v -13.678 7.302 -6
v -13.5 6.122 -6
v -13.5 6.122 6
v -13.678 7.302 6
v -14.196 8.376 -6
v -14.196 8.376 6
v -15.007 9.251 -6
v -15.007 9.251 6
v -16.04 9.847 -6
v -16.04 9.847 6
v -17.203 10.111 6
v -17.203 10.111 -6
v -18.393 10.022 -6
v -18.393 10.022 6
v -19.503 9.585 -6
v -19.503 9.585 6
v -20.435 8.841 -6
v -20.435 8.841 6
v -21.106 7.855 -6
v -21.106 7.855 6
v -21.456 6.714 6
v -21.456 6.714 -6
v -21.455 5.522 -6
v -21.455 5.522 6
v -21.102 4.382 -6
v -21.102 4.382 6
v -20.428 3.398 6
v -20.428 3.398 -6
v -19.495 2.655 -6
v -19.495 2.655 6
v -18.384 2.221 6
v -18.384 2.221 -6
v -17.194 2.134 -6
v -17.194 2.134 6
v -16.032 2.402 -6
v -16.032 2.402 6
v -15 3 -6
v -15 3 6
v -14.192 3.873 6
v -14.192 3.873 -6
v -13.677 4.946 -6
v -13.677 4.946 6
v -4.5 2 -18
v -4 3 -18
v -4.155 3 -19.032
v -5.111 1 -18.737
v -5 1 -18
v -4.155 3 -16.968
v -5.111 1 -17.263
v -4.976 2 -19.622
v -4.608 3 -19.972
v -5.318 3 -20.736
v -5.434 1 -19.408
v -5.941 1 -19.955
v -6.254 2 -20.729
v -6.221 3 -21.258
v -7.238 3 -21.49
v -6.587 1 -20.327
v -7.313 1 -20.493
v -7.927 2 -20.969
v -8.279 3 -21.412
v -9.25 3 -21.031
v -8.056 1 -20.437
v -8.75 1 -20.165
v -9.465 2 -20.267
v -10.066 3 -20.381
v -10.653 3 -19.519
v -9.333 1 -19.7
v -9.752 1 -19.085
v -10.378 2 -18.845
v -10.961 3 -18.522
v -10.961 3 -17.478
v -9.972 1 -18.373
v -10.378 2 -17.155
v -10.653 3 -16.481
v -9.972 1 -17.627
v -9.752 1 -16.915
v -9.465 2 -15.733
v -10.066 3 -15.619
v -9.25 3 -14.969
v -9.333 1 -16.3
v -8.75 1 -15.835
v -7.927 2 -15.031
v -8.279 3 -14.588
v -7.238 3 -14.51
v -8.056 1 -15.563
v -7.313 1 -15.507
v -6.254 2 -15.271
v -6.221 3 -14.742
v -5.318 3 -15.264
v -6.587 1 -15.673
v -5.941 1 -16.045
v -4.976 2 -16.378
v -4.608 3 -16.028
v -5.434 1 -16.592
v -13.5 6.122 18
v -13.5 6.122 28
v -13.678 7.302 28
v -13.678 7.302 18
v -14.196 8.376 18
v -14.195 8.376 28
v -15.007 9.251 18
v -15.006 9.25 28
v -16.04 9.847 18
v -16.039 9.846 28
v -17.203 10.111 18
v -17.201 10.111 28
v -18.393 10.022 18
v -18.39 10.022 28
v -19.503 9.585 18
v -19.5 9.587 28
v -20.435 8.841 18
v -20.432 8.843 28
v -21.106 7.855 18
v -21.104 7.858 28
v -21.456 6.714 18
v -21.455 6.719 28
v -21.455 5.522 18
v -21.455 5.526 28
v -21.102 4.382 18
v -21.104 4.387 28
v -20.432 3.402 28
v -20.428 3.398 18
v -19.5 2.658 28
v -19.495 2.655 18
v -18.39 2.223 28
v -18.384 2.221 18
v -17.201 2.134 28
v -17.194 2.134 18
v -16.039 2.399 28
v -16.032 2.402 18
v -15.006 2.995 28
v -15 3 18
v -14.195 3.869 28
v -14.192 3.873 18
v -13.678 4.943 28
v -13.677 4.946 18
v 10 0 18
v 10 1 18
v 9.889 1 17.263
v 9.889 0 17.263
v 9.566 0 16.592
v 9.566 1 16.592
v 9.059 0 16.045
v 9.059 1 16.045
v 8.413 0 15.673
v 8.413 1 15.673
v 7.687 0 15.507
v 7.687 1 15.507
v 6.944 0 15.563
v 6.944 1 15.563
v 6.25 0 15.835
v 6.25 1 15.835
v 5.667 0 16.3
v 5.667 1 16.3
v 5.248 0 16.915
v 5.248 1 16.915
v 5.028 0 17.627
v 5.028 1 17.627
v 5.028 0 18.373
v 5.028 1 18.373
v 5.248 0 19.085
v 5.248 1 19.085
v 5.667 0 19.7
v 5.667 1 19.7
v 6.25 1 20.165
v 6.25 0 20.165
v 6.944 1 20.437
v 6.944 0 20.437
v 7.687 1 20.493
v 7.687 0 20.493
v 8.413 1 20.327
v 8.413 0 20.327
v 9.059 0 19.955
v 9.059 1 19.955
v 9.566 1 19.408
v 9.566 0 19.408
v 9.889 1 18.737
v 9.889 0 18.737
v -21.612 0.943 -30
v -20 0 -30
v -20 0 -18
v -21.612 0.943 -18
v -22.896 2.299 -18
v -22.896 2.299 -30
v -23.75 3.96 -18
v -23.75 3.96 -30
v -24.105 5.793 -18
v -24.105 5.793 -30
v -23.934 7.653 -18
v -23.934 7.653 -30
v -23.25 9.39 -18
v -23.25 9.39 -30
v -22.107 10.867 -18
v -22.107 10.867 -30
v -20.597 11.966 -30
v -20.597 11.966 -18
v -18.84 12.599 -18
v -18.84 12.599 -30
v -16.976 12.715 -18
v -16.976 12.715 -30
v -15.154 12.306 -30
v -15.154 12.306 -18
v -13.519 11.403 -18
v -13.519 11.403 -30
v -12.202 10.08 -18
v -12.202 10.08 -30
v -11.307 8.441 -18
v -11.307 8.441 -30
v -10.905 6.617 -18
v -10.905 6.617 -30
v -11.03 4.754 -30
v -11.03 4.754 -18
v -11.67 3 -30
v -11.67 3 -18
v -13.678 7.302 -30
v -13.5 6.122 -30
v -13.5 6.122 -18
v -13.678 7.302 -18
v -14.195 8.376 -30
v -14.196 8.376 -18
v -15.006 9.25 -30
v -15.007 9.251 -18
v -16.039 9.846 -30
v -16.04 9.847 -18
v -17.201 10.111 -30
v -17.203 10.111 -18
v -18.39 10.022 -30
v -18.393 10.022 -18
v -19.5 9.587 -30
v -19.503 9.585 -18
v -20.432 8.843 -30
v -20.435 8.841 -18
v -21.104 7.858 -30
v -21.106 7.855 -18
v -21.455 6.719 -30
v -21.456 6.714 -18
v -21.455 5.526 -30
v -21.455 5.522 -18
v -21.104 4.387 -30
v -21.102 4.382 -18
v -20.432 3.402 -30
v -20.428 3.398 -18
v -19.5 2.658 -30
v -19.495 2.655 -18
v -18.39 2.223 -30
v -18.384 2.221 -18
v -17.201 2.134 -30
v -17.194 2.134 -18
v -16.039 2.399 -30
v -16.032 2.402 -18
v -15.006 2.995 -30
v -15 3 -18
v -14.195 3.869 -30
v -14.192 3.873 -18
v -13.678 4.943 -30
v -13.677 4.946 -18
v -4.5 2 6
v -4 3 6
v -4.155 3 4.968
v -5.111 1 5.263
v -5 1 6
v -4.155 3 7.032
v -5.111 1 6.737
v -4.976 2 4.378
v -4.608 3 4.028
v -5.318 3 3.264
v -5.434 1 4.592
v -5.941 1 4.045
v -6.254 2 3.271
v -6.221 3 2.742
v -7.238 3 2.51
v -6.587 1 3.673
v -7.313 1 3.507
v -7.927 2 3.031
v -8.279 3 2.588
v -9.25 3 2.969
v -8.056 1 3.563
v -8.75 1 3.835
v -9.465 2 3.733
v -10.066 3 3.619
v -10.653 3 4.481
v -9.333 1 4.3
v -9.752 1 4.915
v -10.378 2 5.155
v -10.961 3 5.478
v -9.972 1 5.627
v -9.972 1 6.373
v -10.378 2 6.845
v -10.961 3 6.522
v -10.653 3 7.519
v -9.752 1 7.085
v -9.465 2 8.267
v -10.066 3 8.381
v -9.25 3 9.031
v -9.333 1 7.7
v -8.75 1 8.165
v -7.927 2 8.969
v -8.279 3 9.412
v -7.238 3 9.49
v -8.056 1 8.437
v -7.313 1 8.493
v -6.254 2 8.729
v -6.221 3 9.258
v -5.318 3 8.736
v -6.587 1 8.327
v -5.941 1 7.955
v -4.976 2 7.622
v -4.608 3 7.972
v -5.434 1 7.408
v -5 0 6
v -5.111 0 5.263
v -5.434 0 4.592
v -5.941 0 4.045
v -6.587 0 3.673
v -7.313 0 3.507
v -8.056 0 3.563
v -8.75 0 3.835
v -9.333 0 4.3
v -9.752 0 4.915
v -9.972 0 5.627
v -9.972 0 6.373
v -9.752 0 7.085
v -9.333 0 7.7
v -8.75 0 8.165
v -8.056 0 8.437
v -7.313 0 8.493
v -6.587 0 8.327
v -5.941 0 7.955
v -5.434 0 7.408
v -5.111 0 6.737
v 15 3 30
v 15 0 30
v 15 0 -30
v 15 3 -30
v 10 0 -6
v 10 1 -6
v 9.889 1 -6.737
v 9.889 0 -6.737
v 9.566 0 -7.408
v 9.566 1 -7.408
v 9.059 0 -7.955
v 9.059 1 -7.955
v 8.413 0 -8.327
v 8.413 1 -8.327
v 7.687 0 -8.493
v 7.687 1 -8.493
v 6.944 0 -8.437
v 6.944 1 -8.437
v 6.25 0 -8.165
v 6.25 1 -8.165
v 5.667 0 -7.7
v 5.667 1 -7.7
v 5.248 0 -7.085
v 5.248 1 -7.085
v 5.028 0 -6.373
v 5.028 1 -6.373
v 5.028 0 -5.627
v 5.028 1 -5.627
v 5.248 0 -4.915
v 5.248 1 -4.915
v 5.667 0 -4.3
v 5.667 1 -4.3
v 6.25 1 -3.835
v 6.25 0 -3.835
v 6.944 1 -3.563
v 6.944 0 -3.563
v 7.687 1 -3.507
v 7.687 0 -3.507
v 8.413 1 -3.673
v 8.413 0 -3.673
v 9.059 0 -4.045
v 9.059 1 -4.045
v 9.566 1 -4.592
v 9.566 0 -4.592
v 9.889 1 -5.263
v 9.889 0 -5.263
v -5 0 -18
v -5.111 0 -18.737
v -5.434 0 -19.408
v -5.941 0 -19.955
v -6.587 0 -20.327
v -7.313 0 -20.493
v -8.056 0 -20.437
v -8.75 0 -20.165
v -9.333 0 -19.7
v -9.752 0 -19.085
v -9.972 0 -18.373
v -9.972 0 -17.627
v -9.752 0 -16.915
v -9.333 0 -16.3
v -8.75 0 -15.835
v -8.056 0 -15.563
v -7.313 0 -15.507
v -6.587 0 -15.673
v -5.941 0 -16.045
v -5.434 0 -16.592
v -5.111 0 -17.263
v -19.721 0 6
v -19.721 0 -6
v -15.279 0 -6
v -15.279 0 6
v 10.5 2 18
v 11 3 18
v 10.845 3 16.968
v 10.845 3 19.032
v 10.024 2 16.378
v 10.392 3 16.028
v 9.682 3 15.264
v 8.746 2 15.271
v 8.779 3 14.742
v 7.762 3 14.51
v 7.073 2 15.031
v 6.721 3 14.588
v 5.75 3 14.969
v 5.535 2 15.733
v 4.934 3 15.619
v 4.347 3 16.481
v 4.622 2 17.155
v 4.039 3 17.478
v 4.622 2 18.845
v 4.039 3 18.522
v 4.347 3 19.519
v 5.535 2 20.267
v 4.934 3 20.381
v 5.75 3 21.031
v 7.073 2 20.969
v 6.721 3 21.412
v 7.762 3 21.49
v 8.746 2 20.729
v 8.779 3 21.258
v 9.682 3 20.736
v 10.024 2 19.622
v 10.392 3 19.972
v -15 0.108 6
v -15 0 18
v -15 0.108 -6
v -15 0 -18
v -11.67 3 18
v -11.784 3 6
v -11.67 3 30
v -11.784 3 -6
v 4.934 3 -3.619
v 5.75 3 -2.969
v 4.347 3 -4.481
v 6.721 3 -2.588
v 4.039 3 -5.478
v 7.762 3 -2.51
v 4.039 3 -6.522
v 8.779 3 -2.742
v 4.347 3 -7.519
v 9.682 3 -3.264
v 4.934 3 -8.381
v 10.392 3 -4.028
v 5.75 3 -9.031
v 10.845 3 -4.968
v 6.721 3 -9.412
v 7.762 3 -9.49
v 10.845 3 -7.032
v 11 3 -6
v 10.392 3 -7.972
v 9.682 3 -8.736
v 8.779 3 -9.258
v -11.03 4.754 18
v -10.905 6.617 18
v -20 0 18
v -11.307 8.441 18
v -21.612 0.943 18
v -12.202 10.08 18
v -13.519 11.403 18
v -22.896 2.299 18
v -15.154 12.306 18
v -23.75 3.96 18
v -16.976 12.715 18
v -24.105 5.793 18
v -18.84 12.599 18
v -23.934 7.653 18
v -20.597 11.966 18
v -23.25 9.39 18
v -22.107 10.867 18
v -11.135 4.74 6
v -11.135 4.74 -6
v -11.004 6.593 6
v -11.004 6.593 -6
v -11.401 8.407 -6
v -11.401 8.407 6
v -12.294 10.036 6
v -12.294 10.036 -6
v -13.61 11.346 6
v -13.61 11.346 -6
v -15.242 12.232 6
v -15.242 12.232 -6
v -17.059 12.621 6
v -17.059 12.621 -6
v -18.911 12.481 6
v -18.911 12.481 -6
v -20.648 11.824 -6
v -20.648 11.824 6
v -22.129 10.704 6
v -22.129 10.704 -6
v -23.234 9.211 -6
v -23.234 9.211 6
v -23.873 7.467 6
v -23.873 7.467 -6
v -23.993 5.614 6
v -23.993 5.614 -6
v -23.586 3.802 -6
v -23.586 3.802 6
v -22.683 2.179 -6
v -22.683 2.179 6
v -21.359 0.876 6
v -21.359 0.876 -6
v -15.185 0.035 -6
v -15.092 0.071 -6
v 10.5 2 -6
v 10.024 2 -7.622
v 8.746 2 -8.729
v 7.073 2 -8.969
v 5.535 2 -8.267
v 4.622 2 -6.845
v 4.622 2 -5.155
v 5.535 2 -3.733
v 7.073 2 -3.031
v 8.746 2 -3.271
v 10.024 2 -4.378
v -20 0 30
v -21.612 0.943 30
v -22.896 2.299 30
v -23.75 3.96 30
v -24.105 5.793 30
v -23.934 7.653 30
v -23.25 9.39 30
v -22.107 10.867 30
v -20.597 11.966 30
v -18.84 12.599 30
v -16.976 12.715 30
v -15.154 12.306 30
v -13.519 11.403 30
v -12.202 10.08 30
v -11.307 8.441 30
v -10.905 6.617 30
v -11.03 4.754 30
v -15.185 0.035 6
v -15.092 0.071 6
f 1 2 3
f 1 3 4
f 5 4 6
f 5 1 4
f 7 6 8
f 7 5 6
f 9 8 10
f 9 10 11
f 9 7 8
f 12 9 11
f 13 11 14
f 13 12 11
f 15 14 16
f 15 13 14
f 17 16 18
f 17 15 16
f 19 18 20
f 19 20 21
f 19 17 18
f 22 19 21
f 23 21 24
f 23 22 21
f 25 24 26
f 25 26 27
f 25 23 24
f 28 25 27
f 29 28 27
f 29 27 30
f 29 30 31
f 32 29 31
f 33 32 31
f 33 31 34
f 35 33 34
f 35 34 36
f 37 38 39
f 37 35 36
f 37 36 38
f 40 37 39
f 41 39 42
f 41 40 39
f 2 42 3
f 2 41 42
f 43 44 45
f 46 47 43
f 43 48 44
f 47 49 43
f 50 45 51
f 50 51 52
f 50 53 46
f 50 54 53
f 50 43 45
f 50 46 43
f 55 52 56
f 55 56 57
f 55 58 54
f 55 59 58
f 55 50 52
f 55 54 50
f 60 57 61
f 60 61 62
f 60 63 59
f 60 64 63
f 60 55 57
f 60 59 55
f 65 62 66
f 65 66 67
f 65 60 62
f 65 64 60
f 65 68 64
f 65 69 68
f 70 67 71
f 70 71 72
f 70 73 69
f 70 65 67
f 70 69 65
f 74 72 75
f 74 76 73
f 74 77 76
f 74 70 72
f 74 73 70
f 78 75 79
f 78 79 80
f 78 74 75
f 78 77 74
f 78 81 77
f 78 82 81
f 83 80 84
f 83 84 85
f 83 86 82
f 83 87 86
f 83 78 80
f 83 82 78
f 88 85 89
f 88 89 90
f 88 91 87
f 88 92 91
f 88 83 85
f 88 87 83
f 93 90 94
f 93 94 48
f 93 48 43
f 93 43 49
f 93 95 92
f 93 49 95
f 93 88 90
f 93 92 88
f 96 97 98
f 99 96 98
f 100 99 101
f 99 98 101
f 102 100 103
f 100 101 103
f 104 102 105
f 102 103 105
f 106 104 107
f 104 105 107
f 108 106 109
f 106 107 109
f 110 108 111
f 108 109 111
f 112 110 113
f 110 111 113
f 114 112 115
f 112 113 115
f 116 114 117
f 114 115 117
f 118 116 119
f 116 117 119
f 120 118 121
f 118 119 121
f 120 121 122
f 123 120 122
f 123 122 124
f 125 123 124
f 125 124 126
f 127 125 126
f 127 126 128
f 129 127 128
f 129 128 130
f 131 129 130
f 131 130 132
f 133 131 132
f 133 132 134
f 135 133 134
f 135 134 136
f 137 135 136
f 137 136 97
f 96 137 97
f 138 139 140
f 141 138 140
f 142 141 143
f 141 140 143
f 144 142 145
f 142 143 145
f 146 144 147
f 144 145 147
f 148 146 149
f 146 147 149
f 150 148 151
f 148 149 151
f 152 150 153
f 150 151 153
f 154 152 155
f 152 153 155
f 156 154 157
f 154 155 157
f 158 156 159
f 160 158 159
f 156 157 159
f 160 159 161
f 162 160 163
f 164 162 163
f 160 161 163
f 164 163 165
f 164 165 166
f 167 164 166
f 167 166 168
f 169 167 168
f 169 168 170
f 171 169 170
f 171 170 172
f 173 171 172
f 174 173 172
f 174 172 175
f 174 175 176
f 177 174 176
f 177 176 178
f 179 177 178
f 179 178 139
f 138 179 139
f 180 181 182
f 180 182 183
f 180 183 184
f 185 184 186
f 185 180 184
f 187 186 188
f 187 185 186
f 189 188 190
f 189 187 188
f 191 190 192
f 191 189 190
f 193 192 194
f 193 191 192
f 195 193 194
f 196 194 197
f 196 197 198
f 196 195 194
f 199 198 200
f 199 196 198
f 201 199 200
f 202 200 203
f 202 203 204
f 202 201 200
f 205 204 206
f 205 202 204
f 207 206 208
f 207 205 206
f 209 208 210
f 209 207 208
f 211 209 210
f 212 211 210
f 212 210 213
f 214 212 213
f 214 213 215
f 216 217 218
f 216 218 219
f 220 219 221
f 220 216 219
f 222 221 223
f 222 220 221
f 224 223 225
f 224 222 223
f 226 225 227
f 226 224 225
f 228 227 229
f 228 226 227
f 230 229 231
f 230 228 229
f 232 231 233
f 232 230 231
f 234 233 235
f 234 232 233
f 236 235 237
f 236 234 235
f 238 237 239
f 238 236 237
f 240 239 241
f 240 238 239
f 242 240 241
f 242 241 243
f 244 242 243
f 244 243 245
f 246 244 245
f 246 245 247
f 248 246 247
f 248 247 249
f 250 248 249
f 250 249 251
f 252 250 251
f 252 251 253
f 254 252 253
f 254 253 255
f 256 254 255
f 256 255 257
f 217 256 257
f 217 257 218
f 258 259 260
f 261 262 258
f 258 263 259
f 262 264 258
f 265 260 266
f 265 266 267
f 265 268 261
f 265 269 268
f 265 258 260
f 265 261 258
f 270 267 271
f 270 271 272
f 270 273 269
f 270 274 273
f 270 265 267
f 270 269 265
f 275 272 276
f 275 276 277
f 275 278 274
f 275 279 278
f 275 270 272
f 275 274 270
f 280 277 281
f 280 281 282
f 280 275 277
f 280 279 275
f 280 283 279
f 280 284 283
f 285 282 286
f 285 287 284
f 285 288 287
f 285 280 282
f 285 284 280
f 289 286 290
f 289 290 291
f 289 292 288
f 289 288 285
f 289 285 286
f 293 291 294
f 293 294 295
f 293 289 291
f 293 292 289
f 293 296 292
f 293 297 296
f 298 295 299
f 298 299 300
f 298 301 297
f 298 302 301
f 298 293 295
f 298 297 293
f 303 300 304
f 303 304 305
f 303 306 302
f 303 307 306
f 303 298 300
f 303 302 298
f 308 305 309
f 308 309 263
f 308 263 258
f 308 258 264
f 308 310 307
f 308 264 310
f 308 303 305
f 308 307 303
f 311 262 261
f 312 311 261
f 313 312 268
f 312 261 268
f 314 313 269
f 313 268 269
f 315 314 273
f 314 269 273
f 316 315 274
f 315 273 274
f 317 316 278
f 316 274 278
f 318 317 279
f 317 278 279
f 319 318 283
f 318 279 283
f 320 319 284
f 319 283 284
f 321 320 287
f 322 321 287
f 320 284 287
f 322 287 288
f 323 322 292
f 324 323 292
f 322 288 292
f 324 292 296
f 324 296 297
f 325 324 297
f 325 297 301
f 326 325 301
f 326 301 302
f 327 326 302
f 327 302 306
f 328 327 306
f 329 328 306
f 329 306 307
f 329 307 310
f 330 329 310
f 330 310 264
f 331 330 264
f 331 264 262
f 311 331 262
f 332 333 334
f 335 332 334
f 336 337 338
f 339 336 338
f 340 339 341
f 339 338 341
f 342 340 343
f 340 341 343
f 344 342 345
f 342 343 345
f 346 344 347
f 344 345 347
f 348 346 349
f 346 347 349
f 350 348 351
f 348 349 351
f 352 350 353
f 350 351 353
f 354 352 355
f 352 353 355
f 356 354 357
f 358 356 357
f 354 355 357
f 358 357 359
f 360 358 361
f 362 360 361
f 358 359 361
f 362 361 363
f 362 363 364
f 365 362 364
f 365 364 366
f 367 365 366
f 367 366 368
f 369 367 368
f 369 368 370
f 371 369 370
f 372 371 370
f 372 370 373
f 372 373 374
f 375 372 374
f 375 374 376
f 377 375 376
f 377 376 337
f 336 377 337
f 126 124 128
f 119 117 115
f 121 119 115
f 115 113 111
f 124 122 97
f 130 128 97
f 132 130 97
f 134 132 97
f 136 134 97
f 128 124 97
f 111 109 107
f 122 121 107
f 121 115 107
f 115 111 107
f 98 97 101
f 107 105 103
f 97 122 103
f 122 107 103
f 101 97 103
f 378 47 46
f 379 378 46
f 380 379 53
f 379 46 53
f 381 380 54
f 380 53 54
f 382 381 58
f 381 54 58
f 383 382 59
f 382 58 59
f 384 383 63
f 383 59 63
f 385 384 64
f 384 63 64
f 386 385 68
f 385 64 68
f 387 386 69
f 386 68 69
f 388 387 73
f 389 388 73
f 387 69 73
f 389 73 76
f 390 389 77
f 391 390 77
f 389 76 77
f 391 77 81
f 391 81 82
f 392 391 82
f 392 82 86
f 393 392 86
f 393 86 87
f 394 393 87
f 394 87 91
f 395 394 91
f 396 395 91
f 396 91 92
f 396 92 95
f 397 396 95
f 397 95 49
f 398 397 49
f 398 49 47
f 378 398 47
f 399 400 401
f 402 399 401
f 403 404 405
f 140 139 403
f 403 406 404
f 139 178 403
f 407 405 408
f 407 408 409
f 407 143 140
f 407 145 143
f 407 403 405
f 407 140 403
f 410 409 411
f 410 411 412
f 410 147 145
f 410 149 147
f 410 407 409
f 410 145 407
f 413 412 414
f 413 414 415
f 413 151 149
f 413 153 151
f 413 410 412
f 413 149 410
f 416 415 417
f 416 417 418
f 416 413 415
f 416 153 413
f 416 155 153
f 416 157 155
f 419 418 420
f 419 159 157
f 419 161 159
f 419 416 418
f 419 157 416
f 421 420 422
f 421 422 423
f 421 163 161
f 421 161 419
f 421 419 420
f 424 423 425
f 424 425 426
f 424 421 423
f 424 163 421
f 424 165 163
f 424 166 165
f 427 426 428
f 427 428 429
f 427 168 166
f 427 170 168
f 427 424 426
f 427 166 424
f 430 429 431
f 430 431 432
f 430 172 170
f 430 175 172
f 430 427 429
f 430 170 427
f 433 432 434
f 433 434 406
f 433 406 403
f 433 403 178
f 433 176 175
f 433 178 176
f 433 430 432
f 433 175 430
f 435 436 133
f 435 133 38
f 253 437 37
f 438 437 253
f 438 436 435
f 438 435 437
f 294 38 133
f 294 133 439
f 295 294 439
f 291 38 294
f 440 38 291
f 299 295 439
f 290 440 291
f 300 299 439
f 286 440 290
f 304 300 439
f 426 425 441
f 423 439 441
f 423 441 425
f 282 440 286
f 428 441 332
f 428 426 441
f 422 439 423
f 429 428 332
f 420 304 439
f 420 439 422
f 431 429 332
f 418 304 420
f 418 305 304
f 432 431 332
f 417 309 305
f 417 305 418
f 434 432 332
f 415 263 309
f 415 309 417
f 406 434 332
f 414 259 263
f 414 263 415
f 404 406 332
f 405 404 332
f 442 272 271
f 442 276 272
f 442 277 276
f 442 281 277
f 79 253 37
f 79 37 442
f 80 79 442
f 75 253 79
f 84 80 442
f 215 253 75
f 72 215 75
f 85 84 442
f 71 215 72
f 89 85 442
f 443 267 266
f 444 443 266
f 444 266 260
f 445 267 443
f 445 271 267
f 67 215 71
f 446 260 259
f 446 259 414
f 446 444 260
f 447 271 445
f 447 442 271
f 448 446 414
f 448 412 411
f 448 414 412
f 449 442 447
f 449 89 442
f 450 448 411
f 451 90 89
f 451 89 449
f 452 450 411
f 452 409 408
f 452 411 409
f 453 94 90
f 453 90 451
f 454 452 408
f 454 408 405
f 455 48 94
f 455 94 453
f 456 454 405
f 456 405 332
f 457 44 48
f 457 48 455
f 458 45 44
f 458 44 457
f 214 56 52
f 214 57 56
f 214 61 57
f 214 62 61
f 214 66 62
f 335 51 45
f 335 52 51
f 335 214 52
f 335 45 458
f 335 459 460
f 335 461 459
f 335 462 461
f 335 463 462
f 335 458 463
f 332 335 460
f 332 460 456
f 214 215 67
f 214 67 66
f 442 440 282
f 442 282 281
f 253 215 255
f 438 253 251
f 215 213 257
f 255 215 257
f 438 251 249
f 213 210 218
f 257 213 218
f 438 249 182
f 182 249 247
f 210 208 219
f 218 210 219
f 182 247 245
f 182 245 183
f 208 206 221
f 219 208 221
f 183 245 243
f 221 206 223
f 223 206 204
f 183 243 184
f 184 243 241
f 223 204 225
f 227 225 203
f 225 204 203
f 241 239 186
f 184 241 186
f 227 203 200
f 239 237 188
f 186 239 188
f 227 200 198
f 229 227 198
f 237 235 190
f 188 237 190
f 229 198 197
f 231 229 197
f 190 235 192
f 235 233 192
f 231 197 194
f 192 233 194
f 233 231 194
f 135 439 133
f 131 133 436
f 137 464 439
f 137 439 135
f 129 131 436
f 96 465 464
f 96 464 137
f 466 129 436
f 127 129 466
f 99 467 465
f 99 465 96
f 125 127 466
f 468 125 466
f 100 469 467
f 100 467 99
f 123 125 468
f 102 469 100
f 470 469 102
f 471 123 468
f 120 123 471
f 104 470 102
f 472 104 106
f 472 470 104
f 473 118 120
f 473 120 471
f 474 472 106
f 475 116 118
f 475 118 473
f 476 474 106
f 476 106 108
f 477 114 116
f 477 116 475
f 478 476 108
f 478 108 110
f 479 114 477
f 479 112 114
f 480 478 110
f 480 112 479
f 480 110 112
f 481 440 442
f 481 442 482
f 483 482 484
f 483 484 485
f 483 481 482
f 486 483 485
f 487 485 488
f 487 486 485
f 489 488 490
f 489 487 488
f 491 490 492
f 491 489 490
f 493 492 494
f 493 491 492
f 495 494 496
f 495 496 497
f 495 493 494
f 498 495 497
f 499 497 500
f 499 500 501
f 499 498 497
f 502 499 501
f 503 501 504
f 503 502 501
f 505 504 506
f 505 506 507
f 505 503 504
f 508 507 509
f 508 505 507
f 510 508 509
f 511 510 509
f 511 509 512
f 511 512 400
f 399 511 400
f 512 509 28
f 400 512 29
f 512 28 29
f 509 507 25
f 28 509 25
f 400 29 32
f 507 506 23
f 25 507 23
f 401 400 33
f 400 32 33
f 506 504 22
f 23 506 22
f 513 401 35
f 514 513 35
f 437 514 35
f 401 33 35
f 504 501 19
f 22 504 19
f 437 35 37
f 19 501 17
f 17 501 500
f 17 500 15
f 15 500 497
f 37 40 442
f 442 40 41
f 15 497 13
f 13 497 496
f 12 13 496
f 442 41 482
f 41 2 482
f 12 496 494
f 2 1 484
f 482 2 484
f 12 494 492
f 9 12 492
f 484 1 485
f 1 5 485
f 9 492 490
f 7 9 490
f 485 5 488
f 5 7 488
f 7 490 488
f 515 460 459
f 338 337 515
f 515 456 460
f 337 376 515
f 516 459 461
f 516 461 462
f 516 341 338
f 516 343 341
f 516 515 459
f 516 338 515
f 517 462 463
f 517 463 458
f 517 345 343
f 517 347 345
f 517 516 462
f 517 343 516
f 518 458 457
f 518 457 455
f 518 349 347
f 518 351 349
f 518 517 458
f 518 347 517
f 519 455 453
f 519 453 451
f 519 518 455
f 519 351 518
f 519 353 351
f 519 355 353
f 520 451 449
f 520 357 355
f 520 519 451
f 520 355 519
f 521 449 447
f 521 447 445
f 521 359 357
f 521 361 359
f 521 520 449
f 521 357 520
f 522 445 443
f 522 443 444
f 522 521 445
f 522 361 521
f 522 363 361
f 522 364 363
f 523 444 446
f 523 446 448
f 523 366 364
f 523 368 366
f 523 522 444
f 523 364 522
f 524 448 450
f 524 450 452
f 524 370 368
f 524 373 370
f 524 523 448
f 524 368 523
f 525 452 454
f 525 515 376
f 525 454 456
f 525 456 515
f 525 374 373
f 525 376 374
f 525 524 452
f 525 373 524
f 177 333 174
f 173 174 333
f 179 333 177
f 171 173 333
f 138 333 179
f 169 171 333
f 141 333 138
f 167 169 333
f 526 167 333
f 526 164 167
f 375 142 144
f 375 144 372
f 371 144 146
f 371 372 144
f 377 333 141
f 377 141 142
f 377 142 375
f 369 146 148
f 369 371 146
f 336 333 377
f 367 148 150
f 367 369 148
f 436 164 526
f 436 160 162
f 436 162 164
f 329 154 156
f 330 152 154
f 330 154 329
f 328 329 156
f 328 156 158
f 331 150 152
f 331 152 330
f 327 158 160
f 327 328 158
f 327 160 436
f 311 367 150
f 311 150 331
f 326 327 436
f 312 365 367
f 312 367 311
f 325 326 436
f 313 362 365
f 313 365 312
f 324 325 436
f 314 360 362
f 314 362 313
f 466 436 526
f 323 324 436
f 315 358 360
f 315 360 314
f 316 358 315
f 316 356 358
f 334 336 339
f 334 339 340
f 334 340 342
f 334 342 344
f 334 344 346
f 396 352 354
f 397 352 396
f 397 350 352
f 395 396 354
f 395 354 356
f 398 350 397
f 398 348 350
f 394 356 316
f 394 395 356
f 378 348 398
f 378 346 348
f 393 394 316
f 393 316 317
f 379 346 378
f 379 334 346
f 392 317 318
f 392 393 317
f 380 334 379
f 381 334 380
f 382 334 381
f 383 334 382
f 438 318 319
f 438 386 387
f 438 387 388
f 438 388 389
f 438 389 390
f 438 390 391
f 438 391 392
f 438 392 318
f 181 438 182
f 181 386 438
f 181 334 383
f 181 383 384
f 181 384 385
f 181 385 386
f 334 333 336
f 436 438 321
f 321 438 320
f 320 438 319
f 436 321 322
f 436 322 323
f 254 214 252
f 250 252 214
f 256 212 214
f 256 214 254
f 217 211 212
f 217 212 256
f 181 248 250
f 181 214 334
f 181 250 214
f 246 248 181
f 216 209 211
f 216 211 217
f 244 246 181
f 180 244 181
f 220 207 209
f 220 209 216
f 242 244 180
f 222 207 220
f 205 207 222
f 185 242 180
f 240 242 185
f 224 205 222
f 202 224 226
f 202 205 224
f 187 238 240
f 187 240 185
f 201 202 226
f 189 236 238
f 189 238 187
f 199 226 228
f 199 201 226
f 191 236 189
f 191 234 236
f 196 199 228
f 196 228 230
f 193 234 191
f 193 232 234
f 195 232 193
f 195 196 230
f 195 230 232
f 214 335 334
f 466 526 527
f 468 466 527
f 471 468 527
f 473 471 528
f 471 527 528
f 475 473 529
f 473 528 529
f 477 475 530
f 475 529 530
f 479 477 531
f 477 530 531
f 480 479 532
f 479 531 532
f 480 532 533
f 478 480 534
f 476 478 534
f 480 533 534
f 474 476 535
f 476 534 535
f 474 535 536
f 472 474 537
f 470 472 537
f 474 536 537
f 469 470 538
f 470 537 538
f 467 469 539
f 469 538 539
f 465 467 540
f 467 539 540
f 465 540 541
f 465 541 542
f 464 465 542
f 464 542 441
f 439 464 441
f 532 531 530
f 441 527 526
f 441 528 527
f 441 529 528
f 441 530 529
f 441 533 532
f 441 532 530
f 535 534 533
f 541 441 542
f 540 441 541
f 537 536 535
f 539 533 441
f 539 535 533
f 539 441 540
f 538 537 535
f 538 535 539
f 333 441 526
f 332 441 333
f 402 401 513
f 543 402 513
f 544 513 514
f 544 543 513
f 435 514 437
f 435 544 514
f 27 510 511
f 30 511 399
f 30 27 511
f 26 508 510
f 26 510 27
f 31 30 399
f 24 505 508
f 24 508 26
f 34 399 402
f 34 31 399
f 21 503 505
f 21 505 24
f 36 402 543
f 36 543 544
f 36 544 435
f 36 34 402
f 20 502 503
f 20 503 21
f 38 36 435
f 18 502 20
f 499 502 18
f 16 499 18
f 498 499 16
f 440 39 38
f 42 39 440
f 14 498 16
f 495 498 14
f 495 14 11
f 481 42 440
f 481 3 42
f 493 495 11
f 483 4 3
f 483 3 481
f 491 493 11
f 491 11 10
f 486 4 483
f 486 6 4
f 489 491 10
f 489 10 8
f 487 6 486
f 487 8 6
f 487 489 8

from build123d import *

# Parameters (mm, degrees)
SKETCH1_W           = 30
SKETCH1_H           = 60
BOSS_EXTRUDE1_DEPTH = 3
SKETCH2_R           = 4
BOSS_EXTRUDE2_DEPTH = 12
SKETCH3_R           = 4
BOSS_EXTRUDE3_DEPTH = 6
SKETCH8_R           = 2.5
CUT_EXTRUDE1_DEPTH  = 4
CHAMFER1_SIZE       = 1
CHAMFER1_SIZE2      = 2
SKETCH9_R           = 4
BOSS_EXTRUDE4_DEPTH = 2


with BuildPart() as part:
    # Sketch1 → Boss-Extrude1 (new body)
    with BuildSketch(Plane(origin=(0, 0, 0), x_dir=(1, 0, 0), z_dir=(0, 1, 0))):
        Rectangle(SKETCH1_W, SKETCH1_H)
    extrude(amount=BOSS_EXTRUDE1_DEPTH)

    # Sketch2 → Boss-Extrude2 (add)
    with BuildSketch(Plane.XY.offset(30)):
        with BuildLine():
            Line((-15, 0), (-20, 0))
            ThreePointArc((-20, 0), (-17.5, 12.735742832), (-15, 0))
        make_face()
        with Locations((-17.5, 6.122498999)):
            Circle(SKETCH2_R, mode=Mode.SUBTRACT)
    boss_extrude2 = extrude(amount=-BOSS_EXTRUDE2_DEPTH)

    # Mirror1: Boss-Extrude2 across plane
    add(boss_extrude2.mirror(Plane.XY))

    # Sketch3 → Boss-Extrude3 (add, symmetric)
    with BuildSketch(Plane.XY):
        with BuildLine():
            Line((-19.72149558, 0), (-15.27850442, 0))
            ThreePointArc((-15.27850442, 0), (-17.5, 12.635565605), (-19.72149558, 0))
        make_face()
        with Locations((-17.5, 6.122498999)):
            Circle(SKETCH3_R, mode=Mode.SUBTRACT)
    extrude(amount=BOSS_EXTRUDE3_DEPTH, both=True)

    # Sketch8 → Cut-Extrude1 (cut, through all)
    with BuildSketch(Plane(origin=(0, 3, 0), x_dir=(1, 0, 0), z_dir=(0, 1, 0))):
        with Locations((7.5, -18)):
            Circle(SKETCH8_R)
        with Locations((-7.5, -6)):
            Circle(SKETCH8_R)
        with Locations((7.5, 6)):
            Circle(SKETCH8_R)
        with Locations((-7.5, 18)):
            Circle(SKETCH8_R)
    extrude(amount=-CUT_EXTRUDE1_DEPTH, mode=Mode.SUBTRACT)

    # Chamfer1
    chamfer1_edges = [part.edges().sort_by_distance(p)[0] for p in [
        (-10, 3, -18),
        (-10, 3, 6),
        (5, 3, 18),
        (5, 3, -6),
    ]]
    chamfer1_side = [part.faces().sort_by_distance(p)[0] for p in [
        (0.987193721, 3, 0),
    ]]
    chamfer(chamfer1_edges, length=CHAMFER1_SIZE, length2=CHAMFER1_SIZE2, reference=chamfer1_side[0])

    # Sketch9 → Boss-Extrude4 (add)
    with BuildSketch(Plane.XY.offset(30)):
        with Locations((-17.5, 6.122498999)):
            Circle(SKETCH9_R)
    extrude(amount=-BOSS_EXTRUDE4_DEPTH)


solid = part.part
